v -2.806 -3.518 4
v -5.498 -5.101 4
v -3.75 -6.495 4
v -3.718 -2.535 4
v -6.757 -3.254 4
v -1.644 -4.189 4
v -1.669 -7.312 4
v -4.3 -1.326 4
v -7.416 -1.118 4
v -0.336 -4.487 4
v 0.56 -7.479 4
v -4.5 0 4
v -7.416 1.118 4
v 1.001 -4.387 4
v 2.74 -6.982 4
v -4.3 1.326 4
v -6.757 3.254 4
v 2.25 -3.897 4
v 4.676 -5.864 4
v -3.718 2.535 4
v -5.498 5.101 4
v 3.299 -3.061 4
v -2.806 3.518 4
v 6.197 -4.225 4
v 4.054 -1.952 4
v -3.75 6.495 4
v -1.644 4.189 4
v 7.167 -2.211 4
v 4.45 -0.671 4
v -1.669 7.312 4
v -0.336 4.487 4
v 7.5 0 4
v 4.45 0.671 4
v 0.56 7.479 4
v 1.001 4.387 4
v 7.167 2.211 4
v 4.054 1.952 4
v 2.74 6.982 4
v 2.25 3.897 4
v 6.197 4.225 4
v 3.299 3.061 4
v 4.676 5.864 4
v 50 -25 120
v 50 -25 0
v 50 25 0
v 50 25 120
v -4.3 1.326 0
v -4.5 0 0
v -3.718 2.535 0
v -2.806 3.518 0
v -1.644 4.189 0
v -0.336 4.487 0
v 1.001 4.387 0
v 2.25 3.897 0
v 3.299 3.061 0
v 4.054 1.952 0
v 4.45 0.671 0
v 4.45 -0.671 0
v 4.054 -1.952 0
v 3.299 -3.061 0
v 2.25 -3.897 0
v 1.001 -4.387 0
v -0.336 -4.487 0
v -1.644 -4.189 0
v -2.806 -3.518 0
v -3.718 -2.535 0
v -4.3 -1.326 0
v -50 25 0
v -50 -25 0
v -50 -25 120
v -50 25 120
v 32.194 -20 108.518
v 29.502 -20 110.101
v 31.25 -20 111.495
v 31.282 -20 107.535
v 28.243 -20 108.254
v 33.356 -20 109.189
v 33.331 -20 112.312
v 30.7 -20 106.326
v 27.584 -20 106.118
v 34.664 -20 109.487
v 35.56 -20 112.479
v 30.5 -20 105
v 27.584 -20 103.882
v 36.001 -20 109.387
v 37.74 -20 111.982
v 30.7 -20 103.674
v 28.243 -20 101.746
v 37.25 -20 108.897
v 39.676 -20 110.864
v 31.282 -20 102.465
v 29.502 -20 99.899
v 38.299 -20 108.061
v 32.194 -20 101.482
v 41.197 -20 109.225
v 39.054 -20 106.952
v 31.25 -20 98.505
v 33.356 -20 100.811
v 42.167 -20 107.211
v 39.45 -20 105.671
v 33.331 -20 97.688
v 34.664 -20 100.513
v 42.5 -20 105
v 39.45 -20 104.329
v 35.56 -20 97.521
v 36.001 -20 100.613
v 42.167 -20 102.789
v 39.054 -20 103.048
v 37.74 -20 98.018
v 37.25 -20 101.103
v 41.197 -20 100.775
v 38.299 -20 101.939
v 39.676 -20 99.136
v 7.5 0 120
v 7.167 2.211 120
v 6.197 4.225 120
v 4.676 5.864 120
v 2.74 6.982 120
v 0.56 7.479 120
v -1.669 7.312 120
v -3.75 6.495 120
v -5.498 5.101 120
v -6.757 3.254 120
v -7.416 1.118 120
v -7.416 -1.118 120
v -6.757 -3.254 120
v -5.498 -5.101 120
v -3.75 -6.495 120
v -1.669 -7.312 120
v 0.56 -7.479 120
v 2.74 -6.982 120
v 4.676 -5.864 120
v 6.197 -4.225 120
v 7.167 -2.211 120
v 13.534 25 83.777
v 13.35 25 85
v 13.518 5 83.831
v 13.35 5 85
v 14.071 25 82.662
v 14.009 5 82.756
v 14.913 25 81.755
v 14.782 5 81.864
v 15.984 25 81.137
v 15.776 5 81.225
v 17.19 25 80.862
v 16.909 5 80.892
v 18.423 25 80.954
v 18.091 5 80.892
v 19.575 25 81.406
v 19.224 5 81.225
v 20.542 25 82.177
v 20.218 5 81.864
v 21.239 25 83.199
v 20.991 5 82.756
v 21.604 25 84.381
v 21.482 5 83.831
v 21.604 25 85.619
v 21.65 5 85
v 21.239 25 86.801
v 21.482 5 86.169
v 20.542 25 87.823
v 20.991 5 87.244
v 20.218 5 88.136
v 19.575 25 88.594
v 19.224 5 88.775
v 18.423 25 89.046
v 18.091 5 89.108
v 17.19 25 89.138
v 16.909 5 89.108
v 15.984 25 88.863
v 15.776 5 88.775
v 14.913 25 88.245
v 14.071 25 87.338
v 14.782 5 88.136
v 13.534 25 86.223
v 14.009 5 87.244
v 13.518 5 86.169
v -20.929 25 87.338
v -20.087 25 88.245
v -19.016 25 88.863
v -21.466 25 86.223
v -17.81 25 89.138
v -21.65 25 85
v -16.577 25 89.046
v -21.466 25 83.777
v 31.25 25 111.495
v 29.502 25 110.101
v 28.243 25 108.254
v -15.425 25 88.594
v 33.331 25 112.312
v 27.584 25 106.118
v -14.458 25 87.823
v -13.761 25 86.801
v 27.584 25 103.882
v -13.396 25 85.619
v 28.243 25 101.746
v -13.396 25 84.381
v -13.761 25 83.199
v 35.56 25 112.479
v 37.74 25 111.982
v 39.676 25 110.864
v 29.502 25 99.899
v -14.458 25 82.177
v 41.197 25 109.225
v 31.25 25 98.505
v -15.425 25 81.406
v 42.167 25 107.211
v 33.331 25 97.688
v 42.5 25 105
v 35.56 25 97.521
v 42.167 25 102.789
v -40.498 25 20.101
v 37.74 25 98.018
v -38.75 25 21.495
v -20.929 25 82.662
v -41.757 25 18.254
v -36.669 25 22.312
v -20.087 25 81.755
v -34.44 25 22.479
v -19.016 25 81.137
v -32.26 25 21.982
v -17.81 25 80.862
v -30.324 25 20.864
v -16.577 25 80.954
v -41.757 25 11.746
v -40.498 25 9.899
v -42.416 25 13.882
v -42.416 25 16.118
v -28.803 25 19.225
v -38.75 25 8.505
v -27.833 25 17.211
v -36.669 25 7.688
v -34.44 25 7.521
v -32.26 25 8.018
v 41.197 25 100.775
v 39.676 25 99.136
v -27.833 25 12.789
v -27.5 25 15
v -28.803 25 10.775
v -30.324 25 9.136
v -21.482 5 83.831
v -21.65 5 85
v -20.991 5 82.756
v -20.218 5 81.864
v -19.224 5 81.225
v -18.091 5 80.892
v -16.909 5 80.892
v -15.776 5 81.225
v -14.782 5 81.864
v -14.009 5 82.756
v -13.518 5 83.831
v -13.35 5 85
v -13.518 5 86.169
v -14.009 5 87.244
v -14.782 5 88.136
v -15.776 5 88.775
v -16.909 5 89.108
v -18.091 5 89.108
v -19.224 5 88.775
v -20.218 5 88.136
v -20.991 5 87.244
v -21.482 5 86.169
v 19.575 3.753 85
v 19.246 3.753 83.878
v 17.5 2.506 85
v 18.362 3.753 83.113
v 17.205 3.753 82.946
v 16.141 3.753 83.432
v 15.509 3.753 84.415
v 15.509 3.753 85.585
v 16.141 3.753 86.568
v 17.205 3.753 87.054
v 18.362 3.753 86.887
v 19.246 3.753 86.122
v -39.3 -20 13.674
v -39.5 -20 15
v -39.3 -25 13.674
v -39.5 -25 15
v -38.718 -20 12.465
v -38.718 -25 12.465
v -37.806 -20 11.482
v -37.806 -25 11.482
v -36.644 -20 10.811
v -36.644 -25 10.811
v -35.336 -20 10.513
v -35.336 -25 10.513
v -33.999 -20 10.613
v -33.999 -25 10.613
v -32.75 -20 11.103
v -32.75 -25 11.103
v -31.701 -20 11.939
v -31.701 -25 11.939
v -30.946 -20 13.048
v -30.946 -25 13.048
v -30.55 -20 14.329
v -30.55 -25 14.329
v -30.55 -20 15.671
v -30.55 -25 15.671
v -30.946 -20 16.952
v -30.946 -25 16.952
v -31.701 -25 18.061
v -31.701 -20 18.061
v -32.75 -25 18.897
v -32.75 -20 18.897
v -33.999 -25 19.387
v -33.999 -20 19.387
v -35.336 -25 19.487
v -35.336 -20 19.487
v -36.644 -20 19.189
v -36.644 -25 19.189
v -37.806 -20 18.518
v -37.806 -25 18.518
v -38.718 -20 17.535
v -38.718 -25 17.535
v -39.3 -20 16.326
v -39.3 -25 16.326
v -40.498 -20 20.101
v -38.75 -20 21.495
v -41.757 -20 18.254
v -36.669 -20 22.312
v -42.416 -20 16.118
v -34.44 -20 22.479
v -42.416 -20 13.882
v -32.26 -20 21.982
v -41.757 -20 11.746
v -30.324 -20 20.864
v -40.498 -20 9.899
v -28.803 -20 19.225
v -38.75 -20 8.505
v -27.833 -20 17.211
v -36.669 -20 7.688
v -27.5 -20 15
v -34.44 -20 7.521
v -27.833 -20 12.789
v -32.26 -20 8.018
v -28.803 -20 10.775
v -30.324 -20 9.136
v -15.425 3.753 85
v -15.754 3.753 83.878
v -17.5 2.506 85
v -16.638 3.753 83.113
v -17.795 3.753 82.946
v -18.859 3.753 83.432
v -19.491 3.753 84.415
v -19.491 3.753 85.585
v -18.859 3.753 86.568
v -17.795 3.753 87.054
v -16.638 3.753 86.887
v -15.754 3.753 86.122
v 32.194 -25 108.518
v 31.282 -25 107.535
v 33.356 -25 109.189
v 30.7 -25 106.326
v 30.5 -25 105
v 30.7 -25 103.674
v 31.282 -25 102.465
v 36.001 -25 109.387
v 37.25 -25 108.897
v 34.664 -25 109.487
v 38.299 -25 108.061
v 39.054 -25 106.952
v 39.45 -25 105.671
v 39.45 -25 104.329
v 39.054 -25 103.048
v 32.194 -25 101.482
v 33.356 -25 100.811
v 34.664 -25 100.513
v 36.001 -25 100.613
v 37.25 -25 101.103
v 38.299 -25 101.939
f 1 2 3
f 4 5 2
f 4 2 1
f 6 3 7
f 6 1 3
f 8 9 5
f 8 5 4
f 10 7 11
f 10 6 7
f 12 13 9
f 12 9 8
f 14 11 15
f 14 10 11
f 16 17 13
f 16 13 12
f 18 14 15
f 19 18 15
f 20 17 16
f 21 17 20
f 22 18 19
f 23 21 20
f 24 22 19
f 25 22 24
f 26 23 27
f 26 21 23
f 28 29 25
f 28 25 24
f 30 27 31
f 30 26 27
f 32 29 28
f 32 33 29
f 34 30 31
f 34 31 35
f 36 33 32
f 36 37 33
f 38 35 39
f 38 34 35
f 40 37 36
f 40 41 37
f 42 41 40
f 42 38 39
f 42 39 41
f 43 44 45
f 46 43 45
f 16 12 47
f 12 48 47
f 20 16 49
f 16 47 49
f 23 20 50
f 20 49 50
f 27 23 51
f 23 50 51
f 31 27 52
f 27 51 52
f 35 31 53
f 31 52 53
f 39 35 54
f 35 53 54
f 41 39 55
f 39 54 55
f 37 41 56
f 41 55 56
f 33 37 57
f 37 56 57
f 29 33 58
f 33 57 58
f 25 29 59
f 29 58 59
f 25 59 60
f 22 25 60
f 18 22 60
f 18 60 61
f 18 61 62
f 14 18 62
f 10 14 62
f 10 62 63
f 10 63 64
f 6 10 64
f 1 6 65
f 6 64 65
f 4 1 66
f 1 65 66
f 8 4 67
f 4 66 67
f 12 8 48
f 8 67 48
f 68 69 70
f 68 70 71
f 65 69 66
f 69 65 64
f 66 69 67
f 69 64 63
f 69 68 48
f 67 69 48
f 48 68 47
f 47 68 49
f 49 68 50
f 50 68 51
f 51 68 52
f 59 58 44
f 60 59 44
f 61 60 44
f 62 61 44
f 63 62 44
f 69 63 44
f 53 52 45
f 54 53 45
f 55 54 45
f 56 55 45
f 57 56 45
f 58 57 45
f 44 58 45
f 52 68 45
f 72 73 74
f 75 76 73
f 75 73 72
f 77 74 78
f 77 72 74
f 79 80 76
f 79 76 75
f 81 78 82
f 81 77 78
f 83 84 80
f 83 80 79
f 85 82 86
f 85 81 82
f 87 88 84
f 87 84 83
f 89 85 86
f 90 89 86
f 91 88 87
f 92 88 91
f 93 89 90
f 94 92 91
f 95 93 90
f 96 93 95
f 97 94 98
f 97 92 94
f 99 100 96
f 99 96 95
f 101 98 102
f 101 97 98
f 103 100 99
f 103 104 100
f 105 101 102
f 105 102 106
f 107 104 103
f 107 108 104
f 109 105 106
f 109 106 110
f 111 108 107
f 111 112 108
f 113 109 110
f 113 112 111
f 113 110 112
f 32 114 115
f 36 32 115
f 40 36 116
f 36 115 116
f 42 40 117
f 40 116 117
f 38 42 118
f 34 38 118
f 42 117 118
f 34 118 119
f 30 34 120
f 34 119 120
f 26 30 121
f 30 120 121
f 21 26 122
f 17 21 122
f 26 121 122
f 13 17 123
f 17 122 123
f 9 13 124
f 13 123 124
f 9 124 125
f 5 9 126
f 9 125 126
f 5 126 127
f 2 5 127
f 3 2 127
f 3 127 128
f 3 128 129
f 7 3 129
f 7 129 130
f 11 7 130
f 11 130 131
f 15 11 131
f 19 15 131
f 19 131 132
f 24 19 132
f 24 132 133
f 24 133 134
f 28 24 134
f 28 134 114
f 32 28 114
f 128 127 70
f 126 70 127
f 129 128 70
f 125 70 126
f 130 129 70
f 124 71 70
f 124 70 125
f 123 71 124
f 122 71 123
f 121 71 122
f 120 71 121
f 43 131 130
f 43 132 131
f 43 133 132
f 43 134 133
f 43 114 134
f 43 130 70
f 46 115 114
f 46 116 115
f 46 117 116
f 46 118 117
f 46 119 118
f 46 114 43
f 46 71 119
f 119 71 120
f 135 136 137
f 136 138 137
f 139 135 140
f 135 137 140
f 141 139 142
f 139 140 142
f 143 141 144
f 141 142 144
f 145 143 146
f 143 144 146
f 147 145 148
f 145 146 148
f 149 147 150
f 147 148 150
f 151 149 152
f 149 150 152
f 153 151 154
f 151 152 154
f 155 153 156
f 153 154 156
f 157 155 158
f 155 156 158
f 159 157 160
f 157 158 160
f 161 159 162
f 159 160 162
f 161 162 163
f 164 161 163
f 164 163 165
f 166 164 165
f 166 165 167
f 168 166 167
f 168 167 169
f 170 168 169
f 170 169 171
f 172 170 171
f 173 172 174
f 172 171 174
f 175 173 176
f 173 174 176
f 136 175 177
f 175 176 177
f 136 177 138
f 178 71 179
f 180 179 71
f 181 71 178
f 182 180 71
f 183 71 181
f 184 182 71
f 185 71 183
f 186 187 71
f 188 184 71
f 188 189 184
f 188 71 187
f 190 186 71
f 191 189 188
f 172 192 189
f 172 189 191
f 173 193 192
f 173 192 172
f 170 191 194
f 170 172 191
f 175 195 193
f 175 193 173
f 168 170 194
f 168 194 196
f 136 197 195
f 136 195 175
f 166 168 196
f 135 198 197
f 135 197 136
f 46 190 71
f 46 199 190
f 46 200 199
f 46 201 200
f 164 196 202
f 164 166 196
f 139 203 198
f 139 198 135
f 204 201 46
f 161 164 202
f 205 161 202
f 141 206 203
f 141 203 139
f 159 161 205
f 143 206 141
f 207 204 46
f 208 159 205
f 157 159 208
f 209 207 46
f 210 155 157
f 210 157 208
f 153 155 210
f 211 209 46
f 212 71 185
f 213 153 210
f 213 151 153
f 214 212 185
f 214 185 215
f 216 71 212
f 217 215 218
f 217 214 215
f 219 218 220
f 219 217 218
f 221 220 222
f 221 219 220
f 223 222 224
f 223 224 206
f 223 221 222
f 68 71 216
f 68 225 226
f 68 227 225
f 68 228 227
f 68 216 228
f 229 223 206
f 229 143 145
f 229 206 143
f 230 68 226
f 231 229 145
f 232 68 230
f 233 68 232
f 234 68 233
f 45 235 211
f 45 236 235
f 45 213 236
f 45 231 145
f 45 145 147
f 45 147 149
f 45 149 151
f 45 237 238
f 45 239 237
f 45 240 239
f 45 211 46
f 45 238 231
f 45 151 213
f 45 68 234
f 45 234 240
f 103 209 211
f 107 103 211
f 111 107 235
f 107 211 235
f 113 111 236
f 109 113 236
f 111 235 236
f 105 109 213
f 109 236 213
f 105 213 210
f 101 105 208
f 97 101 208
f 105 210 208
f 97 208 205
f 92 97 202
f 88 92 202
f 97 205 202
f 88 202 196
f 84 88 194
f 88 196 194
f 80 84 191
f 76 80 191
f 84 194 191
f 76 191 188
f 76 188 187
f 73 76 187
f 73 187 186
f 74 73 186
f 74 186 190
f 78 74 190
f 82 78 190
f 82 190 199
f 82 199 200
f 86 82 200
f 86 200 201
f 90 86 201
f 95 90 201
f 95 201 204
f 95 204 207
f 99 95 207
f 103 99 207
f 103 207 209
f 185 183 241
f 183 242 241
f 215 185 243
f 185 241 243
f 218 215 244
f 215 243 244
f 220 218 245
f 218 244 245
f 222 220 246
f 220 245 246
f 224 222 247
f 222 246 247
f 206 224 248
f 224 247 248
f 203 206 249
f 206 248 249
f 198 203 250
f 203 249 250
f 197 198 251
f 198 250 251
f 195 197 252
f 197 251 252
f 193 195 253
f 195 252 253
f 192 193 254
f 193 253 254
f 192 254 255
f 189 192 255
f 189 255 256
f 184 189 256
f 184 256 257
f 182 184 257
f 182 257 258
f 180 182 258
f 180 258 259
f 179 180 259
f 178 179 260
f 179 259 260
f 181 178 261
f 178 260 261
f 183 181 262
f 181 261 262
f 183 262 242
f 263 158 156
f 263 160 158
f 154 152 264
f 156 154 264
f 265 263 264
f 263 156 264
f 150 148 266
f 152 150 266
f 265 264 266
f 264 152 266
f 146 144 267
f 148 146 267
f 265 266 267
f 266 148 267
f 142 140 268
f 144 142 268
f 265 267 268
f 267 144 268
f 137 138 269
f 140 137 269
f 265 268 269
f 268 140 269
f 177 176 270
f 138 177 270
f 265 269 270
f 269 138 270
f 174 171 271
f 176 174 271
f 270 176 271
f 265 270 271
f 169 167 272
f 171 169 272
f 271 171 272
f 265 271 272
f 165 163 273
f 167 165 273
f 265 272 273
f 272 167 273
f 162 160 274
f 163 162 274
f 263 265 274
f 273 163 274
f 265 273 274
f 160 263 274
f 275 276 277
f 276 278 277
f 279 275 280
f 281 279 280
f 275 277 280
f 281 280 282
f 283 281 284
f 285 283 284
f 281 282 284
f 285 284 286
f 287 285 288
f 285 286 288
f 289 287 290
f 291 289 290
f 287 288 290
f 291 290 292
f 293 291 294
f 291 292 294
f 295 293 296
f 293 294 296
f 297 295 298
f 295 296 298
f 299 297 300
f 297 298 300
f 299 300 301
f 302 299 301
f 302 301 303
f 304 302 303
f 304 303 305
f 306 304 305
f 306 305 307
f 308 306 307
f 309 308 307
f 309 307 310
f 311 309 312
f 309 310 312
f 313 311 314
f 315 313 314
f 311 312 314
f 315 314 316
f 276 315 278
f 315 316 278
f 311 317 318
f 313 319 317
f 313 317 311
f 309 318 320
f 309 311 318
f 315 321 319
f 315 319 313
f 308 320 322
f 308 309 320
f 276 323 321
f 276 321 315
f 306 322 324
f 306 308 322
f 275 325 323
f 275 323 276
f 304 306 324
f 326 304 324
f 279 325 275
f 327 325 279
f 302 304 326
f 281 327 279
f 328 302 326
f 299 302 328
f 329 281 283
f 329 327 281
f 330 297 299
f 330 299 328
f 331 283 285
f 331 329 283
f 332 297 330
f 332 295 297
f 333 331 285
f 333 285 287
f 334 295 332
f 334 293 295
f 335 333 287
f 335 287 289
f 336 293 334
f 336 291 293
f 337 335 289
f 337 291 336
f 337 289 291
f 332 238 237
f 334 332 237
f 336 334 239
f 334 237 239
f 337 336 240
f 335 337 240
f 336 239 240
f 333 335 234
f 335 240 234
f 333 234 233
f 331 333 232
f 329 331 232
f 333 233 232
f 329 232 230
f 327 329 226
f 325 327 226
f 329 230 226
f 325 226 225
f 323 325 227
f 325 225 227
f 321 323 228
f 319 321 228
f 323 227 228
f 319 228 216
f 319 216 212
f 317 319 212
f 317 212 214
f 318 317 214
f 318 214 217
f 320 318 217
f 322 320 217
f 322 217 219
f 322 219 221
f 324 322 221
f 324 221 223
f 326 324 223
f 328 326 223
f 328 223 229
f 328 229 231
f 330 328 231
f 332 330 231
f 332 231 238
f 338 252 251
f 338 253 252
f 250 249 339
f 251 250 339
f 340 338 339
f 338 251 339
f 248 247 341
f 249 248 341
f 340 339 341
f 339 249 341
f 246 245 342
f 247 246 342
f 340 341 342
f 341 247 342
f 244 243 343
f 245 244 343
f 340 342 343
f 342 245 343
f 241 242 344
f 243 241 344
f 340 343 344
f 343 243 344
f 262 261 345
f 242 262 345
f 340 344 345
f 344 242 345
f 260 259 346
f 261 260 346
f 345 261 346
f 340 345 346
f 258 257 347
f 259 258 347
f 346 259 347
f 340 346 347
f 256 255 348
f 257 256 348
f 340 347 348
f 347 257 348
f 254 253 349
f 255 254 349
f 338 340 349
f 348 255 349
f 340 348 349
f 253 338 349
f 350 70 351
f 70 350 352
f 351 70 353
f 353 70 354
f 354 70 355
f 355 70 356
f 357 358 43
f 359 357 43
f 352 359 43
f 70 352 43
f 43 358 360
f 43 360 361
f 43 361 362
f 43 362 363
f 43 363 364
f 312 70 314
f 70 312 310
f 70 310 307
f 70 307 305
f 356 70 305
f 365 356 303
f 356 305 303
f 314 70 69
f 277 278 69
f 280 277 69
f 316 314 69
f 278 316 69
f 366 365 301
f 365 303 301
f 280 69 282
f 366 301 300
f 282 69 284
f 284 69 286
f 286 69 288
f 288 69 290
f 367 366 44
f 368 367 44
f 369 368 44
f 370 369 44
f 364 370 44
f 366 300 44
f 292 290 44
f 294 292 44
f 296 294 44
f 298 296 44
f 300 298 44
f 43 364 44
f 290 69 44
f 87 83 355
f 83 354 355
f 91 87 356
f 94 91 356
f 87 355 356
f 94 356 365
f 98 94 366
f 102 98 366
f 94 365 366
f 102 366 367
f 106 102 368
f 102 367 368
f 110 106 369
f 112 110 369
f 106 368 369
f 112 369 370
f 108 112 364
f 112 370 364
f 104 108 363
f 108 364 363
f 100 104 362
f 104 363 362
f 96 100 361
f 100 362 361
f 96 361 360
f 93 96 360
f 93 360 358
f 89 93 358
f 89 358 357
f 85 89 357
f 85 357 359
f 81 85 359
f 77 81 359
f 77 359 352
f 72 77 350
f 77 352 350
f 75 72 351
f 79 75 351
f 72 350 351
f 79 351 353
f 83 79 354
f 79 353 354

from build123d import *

# Parameters (mm, degrees)
SKIZZE1_W                                           = 100
SKIZZE1_H                                           = 50
AUFSATZ_LINEAR_AUSTRAGEN1_DEPTH                     = 120
STIRNSENKUNG_F_R_M8_SENKSCHRAUBE_KOPF_B_D           = 9
STIRNSENKUNG_F_R_M8_SENKSCHRAUBE_KOPF_B_CBORE_D     = 15
STIRNSENKUNG_F_R_M8_SENKSCHRAUBE_KOPF_B_CBORE_DEPTH = 45
STIRNSENKUNG_F_R_M8_SENKSCHRAUBE_KO_2_D             = 9
STIRNSENKUNG_F_R_M8_SENKSCHRAUBE_KO_2_CBORE_D       = 15
STIRNSENKUNG_F_R_M8_SENKSCHRAUBE_KO_2_CBORE_DEPTH   = 116
KERNLOCH_F_R_M8_HELICOIL1_D                         = 8.3
KERNLOCH_F_R_M8_HELICOIL1_DEPTH                     = 20
KERNLOCH_F_R_M8_HELICOIL1_TIP                       = 2.493571569


with BuildPart() as part:
    # Skizze1 → Aufsatz-Linear austragen1 (new body)
    with BuildSketch(Plane.XY):
        Rectangle(SKIZZE1_W, SKIZZE1_H)
    extrude(amount=AUFSATZ_LINEAR_AUSTRAGEN1_DEPTH)

    # Stirnsenkung f_r M8 Senkschraube _Kopf B (through all)
    with Locations(Plane(origin=(0, 25, 0), x_dir=(1, 0, 0), z_dir=(0, 1, 0))):
        with Locations((35, -105), (-35, -15)):
            CounterBoreHole(STIRNSENKUNG_F_R_M8_SENKSCHRAUBE_KOPF_B_D / 2, STIRNSENKUNG_F_R_M8_SENKSCHRAUBE_KOPF_B_CBORE_D / 2, STIRNSENKUNG_F_R_M8_SENKSCHRAUBE_KOPF_B_CBORE_DEPTH)

    # Stirnsenkung f_r M8 Senkschraube _Ko 2 (through all)
    with Locations(Plane.XY.offset(120)):
        with Locations((0, 0)):
            CounterBoreHole(STIRNSENKUNG_F_R_M8_SENKSCHRAUBE_KO_2_D / 2, STIRNSENKUNG_F_R_M8_SENKSCHRAUBE_KO_2_CBORE_D / 2, STIRNSENKUNG_F_R_M8_SENKSCHRAUBE_KO_2_CBORE_DEPTH)

    # Kernloch für M8 Helicoil1
    with Locations(Plane(origin=(0, 25, 0), x_dir=(1, 0, 0), z_dir=(0, 1, 0))):
        with Locations((-17.5, -85), (17.5, -85)):
            Hole(KERNLOCH_F_R_M8_HELICOIL1_D / 2, depth=KERNLOCH_F_R_M8_HELICOIL1_DEPTH)
            with Locations((0, 0, -(KERNLOCH_F_R_M8_HELICOIL1_DEPTH + KERNLOCH_F_R_M8_HELICOIL1_TIP / 2))):  # 118° drill point
                Cone(0, KERNLOCH_F_R_M8_HELICOIL1_D / 2, KERNLOCH_F_R_M8_HELICOIL1_TIP, mode=Mode.SUBTRACT)


solid = part.part
